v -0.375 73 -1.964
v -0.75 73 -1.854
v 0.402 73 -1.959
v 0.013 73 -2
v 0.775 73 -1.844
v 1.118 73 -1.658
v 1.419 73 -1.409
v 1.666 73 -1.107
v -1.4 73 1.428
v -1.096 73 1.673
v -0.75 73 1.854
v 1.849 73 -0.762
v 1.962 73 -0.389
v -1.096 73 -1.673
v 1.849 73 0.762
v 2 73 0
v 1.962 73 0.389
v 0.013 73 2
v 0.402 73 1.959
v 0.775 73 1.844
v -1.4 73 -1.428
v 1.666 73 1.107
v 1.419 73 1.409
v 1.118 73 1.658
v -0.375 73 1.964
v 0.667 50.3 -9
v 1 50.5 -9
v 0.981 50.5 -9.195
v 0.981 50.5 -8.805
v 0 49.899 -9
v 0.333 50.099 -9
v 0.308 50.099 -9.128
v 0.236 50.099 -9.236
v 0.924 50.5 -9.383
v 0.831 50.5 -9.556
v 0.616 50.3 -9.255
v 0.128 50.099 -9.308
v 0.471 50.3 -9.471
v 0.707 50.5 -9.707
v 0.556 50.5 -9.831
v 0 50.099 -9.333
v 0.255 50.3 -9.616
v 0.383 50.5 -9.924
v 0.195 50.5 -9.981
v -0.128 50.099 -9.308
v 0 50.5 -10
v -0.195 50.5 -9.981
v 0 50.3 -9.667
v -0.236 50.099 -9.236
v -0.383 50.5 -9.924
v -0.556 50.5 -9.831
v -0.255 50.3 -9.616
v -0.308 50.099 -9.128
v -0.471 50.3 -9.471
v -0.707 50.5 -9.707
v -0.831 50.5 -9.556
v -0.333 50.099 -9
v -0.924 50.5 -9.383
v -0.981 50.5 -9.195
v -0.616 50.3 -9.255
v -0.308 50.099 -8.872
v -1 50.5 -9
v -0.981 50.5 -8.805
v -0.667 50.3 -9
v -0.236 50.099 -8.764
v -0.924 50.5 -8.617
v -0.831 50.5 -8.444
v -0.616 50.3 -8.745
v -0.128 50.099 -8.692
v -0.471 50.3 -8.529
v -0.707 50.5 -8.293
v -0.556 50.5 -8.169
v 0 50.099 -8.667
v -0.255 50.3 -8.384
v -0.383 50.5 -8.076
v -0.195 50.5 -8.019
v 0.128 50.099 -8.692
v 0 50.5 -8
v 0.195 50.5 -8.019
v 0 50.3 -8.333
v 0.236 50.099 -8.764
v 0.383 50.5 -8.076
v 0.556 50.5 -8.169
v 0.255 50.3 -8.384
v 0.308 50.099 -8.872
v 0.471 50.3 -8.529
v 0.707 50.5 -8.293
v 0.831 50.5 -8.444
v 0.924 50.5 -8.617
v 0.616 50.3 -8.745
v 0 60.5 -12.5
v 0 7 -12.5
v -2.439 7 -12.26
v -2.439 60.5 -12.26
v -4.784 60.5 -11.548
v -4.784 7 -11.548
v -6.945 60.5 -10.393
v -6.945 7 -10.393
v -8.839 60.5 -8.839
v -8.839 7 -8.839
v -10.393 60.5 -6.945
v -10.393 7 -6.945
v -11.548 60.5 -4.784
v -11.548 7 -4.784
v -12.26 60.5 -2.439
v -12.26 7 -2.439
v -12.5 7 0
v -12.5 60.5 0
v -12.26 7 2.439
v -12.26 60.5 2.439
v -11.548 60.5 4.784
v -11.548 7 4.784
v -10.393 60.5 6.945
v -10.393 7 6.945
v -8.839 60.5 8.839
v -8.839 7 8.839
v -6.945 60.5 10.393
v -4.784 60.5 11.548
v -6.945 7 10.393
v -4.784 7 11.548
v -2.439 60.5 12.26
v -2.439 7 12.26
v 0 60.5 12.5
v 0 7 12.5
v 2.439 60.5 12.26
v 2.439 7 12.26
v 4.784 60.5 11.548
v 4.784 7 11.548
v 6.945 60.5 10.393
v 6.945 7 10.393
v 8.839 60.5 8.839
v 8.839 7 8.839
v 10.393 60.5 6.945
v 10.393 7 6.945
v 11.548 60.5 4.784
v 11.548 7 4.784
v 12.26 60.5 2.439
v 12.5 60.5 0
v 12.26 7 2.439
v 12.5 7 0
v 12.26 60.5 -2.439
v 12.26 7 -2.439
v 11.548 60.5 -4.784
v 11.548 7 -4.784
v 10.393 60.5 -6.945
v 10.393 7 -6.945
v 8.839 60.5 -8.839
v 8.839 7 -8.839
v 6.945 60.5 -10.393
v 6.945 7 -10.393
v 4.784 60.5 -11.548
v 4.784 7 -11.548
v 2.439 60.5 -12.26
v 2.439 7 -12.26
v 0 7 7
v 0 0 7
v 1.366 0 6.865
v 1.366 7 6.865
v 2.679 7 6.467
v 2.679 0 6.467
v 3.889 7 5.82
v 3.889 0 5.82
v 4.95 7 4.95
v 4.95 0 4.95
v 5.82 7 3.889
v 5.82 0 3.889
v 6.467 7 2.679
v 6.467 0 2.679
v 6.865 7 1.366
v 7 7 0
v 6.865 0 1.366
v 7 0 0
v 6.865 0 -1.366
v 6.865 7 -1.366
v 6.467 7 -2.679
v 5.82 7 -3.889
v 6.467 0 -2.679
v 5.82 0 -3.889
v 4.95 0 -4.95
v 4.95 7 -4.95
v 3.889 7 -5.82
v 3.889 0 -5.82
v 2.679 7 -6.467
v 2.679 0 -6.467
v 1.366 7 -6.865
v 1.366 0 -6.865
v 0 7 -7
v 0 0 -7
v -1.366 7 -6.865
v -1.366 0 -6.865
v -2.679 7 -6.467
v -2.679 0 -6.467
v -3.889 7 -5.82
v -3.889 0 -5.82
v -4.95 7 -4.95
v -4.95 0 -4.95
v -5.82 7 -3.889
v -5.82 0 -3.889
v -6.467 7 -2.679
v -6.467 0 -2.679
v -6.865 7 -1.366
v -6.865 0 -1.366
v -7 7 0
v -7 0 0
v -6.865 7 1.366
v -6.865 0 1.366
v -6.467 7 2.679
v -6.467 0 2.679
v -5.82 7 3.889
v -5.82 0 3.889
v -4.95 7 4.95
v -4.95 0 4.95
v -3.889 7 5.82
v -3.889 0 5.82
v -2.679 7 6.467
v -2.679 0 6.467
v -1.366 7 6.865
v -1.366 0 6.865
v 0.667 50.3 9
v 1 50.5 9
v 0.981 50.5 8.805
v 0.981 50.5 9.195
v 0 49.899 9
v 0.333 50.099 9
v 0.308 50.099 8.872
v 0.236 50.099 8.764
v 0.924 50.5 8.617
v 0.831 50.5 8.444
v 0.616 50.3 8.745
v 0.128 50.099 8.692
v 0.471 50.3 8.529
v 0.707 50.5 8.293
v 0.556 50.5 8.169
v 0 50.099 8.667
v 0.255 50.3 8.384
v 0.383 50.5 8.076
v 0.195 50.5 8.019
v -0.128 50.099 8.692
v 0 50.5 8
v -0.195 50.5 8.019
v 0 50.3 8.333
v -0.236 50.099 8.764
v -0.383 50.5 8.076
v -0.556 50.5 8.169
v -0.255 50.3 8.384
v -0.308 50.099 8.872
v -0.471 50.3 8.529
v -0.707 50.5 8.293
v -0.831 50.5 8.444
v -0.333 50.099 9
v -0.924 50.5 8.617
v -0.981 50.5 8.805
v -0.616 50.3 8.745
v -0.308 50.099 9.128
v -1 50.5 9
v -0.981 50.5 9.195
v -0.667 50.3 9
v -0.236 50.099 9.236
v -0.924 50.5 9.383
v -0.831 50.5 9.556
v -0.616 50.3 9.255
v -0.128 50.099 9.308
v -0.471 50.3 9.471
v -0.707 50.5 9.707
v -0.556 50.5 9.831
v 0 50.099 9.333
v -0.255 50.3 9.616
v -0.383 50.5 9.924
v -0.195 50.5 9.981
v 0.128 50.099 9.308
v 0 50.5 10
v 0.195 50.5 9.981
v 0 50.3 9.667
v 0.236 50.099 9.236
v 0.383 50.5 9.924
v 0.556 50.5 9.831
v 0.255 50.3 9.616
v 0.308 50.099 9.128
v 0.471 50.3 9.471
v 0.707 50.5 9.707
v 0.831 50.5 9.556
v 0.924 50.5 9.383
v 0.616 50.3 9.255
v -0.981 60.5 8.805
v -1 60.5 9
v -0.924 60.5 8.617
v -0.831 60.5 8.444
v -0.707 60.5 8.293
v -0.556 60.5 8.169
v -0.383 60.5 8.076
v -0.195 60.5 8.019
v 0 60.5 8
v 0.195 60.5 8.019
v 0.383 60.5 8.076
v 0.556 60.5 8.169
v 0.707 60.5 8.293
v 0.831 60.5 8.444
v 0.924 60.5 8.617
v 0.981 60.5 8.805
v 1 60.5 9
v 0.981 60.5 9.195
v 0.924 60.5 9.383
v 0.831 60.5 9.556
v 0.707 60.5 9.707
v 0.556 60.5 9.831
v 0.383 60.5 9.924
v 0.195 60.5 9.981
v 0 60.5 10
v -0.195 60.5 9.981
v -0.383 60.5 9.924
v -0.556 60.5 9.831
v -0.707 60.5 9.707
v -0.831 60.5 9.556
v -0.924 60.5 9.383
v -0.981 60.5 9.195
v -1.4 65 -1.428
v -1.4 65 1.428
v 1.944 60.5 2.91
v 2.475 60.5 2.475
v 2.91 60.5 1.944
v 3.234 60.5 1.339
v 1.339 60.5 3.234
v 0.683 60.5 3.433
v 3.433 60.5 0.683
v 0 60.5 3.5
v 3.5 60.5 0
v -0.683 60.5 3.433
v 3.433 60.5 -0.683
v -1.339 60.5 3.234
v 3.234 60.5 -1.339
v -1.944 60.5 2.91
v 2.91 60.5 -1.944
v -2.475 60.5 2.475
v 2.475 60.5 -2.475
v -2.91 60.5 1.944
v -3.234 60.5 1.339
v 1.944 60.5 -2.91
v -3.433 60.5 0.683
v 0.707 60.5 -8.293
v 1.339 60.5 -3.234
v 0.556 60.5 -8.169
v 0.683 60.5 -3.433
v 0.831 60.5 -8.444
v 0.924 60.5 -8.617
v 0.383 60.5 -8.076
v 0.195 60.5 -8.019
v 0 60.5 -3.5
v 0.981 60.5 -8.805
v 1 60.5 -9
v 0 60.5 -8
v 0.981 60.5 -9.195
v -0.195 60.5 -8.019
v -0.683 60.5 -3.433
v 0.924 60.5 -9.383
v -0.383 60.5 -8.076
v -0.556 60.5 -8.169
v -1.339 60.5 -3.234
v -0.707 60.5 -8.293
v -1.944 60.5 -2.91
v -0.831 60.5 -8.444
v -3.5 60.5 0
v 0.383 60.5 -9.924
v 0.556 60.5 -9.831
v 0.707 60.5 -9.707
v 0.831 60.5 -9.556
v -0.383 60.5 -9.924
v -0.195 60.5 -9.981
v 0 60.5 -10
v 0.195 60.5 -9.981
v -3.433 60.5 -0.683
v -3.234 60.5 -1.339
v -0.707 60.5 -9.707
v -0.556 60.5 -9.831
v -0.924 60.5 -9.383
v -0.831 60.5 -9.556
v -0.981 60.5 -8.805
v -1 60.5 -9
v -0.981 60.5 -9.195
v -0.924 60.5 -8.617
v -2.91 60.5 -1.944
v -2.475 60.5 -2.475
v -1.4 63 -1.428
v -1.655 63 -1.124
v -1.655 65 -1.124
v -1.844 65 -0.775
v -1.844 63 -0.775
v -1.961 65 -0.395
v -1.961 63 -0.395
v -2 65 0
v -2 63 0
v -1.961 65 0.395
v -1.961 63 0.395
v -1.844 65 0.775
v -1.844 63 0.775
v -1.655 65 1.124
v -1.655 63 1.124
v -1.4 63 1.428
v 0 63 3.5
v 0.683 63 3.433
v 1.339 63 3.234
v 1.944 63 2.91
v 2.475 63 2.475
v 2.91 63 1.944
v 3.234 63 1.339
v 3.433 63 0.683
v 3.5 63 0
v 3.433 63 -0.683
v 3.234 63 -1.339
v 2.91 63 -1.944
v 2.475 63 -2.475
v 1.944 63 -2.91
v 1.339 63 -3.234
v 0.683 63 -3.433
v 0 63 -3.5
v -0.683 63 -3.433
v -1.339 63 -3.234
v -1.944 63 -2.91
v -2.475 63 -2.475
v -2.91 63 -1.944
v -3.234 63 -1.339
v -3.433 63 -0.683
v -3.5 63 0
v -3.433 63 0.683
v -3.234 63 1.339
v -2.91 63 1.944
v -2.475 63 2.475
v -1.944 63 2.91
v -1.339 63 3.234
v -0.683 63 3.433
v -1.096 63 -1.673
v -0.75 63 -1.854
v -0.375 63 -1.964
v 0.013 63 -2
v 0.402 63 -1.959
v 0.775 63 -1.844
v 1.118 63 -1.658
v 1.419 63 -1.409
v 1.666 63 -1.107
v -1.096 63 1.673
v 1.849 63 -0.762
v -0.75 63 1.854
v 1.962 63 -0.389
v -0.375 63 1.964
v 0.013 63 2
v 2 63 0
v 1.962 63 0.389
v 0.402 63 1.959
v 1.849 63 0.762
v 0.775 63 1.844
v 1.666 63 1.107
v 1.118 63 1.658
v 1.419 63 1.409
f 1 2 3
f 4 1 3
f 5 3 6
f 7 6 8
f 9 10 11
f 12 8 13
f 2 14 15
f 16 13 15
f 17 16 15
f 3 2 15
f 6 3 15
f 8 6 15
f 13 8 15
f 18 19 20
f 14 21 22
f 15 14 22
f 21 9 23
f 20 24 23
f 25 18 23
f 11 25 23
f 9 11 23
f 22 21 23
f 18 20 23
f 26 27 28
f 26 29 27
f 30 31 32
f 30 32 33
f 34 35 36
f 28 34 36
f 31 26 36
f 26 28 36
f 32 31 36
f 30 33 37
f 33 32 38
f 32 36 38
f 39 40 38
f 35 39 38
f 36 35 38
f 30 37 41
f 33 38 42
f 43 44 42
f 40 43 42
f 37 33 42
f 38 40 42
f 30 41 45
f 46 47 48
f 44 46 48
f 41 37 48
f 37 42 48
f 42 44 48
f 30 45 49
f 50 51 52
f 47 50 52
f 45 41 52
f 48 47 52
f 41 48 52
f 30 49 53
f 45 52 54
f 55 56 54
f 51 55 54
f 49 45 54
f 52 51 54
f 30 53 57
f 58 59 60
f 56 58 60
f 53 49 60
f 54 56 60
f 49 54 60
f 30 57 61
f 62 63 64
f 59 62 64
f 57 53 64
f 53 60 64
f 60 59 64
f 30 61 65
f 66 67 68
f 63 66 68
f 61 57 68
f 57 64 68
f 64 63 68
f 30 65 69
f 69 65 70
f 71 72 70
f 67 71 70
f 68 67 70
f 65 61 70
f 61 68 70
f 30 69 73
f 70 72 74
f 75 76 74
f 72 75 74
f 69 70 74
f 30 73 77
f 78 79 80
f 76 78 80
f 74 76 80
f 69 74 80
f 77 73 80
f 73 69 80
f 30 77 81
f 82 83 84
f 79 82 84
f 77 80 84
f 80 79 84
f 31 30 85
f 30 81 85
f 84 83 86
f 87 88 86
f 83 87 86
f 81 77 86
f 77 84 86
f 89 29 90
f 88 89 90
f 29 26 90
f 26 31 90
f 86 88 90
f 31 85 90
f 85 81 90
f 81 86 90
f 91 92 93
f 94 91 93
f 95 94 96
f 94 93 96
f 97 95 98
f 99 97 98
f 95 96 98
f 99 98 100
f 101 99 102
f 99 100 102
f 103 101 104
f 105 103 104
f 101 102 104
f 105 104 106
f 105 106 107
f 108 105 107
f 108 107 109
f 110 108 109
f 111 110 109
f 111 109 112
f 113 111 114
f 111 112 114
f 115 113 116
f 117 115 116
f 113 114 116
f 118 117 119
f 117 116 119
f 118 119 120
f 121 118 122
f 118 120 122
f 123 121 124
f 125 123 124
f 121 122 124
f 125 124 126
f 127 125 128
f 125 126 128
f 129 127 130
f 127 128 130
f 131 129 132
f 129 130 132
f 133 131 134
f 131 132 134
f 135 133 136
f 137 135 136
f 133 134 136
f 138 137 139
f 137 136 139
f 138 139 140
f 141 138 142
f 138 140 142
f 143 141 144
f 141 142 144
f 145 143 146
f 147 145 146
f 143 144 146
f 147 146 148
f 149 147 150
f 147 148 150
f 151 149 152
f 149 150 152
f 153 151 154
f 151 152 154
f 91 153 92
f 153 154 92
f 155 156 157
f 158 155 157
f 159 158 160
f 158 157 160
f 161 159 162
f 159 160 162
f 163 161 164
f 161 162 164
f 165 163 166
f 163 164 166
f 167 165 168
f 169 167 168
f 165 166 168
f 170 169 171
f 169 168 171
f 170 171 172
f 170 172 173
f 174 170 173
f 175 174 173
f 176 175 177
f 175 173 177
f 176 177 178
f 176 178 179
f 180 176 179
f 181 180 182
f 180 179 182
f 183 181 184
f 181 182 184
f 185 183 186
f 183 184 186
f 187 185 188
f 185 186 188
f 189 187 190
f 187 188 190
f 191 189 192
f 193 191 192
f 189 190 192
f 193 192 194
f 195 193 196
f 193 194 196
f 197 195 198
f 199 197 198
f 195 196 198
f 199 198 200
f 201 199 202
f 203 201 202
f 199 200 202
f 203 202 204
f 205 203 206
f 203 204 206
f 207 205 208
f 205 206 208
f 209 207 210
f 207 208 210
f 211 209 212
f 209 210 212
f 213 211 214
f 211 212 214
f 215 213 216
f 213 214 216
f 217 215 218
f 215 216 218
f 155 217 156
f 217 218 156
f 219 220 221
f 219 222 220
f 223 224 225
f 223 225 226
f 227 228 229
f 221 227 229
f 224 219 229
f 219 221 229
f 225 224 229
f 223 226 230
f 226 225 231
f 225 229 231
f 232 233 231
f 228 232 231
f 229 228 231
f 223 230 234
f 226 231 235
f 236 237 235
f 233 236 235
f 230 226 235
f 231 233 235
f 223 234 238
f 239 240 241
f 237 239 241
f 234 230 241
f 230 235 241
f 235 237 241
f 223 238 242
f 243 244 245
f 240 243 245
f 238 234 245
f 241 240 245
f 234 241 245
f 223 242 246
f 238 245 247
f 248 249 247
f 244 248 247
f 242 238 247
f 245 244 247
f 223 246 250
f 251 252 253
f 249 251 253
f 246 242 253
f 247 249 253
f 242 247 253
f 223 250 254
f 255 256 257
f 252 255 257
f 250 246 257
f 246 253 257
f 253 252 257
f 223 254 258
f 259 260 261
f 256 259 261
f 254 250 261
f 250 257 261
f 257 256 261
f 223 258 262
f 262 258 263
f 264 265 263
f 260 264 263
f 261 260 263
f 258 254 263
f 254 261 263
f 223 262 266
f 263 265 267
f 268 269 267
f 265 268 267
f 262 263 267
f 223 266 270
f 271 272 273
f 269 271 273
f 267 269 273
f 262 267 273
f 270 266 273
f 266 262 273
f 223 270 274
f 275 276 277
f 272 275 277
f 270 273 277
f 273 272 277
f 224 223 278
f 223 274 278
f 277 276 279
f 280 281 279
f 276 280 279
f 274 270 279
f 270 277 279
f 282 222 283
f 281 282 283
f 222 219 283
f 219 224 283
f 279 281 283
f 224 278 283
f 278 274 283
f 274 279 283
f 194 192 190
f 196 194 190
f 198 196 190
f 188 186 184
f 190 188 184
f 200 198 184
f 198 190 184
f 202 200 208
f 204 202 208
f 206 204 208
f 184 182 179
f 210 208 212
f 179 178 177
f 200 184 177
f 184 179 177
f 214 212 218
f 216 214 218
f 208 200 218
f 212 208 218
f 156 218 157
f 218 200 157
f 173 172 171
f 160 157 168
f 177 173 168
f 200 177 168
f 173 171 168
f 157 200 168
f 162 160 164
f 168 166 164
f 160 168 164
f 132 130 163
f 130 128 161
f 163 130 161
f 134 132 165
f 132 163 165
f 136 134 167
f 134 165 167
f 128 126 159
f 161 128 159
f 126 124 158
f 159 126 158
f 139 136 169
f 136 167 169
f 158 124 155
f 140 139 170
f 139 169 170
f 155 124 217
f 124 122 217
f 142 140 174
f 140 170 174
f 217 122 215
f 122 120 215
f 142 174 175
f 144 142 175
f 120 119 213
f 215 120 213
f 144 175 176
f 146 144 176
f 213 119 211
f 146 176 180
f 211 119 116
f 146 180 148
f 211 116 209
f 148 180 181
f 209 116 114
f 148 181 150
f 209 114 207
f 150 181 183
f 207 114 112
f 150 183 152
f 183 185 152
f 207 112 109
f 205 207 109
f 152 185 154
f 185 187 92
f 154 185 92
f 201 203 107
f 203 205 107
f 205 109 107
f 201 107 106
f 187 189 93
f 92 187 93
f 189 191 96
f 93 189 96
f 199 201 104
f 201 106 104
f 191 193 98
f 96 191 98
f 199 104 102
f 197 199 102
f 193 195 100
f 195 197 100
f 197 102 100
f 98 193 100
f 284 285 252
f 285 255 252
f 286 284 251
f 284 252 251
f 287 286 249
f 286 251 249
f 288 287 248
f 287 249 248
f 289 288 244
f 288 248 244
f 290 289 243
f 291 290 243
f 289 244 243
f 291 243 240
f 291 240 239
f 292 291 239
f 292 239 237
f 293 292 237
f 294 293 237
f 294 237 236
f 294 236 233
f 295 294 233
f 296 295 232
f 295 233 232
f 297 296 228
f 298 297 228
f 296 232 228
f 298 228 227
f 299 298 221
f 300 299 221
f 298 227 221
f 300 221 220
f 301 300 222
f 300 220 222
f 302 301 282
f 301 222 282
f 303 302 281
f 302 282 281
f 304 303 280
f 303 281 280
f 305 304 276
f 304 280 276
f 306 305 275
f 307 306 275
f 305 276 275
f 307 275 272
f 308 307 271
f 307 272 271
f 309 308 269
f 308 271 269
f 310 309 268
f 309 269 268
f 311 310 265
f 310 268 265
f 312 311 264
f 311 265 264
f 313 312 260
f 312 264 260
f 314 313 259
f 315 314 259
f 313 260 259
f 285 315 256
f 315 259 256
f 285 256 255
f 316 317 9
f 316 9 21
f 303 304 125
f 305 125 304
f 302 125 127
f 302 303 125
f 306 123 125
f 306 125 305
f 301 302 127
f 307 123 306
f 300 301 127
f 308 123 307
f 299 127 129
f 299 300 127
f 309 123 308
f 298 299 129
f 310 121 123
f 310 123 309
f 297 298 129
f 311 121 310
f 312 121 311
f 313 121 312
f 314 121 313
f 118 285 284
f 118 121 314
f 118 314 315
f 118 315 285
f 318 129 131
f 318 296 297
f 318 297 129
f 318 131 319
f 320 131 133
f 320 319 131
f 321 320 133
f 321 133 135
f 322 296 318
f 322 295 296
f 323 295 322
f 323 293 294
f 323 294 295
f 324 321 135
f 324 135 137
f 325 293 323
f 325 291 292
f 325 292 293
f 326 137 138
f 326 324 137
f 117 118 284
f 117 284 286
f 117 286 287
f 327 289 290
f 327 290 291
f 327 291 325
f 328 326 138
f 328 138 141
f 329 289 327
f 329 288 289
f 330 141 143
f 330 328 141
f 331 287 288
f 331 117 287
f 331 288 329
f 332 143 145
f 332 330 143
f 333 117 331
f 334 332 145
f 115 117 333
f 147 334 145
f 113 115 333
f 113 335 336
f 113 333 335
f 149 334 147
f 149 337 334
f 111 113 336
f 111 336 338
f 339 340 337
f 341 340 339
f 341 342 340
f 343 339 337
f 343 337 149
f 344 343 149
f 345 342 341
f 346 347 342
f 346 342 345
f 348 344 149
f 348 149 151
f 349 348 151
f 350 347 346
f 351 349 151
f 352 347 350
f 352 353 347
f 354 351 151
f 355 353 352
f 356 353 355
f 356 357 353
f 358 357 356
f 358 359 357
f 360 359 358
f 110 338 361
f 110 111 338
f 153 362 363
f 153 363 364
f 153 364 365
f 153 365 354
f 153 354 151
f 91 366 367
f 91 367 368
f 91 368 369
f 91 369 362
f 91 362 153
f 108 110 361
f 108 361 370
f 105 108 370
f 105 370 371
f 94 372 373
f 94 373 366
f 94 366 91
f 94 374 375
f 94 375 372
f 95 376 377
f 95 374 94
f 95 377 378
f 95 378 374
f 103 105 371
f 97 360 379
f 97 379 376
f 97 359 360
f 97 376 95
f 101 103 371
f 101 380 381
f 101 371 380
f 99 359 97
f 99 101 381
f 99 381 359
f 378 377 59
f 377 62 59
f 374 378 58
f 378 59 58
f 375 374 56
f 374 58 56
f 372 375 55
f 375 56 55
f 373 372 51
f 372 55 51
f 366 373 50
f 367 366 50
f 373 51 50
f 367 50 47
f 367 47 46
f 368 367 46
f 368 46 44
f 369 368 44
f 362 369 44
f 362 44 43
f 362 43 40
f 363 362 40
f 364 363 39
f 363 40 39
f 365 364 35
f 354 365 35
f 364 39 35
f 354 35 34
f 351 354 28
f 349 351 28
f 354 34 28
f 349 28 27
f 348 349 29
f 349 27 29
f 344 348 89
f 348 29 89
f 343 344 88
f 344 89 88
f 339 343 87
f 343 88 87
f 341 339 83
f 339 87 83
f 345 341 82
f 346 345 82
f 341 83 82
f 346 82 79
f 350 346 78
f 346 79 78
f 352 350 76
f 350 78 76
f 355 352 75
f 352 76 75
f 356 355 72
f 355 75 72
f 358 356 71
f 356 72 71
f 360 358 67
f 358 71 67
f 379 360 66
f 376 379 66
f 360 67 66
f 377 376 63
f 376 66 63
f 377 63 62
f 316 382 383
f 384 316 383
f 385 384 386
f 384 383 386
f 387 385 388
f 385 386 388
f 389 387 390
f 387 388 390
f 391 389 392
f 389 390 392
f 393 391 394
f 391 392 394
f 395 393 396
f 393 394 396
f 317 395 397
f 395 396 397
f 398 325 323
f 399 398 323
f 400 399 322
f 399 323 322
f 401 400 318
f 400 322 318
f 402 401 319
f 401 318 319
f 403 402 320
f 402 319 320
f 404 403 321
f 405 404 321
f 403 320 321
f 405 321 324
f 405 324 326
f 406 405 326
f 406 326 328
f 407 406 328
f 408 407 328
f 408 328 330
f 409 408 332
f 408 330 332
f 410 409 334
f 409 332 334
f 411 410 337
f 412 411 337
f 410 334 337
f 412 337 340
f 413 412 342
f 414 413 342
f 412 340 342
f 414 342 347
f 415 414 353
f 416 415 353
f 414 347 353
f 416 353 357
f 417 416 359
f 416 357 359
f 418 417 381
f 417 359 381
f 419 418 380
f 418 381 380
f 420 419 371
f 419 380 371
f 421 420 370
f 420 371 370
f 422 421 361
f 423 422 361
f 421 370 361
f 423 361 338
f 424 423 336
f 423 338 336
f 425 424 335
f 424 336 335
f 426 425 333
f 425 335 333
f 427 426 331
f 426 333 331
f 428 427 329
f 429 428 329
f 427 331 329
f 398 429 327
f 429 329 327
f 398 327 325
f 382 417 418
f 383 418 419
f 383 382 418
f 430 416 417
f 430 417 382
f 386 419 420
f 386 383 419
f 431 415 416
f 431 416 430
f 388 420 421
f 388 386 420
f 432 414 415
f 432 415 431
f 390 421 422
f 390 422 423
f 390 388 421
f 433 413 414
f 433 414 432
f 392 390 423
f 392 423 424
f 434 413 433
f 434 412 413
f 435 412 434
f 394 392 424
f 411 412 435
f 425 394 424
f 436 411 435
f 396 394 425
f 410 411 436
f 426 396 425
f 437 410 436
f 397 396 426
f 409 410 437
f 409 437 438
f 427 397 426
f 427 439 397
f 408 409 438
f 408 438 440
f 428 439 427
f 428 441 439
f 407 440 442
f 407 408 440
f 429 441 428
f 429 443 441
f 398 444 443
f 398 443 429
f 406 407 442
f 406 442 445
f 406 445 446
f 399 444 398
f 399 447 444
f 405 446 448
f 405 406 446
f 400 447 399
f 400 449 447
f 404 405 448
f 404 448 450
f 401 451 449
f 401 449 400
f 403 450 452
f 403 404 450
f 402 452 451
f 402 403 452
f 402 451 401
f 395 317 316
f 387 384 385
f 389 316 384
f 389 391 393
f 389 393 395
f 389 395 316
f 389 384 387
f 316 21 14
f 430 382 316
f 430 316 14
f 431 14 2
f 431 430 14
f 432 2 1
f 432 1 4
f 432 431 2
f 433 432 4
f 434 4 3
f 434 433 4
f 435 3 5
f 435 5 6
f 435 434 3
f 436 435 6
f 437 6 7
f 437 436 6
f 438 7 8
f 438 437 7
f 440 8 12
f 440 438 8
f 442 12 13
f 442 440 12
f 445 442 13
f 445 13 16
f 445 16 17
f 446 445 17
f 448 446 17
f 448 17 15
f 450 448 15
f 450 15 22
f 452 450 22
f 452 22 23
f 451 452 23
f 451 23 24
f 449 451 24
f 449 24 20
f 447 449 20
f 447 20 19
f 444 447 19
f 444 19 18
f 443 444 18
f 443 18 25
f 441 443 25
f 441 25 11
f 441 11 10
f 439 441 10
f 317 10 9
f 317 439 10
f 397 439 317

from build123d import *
from build123d.topology import SkipClean

# Parameters (mm, degrees)
SKETCH1_R        = 7
EXTRUSION1_DEPTH = 7
SKETCH2_R        = 12.5
EXTRUSION2_DEPTH = 53.5
SKETCH3_R        = 3.5
EXTRUSION3_DEPTH = 2.5
EXTRUSION4_DEPTH = 10
SKETCH5_R        = 2
EXTRUSION5_DEPTH = 2
HOLE1_D          = 2
HOLE1_DEPTH      = 10
HOLE1_TIP        = 0.600860619


with BuildPart() as part:
    # Sketch1 → Extrusion1 (new body)
    with BuildSketch(Plane(origin=(0, 0, 0), x_dir=(-1, 0, 0), z_dir=(0, 1, 0))):
        with Locations(Location((0, 0, 0), (0, 0, 90))):
            Circle(SKETCH1_R)
    extrude(amount=EXTRUSION1_DEPTH)

    # Sketch2 → Extrusion2 (add)
    with BuildSketch(Plane(origin=(0, 7, 0), x_dir=(-1, 0, 0), z_dir=(0, 1, 0))):
        with Locations(Location((0, 0, 0), (0, 0, 270))):
            Circle(SKETCH2_R)
    extrude(amount=EXTRUSION2_DEPTH)

    # Sketch3 → Extrusion3 (add)
    with BuildSketch(Plane(origin=(0, 60.5, 0), x_dir=(-1, 0, 0), z_dir=(0, 1, 0))):
        with Locations(Location((0, 0, 0), (0, 0, 90))):
            Circle(SKETCH3_R)
    extrude(amount=EXTRUSION3_DEPTH)

    # Sketch4 → Extrusion4 (add)
    with BuildSketch(Plane(origin=(0, 63, 0), x_dir=(-1, 0, 0), z_dir=(0, 1, 0))):
        with BuildLine():
            Line((1.4, 1.428285686), (1.4, -1.428285686))
            ThreePointArc((1.4, -1.428285686), (-2, 0), (1.4, 1.428285686))
        make_face()
    extrude(amount=EXTRUSION4_DEPTH)

    # Sketch5 → Extrusion5 (add)
    with SkipClean():  # the faces are left unmerged after this step: merging them gives an invalid solid
        with BuildSketch(Plane(origin=(0, 63, 0), x_dir=(1, 0, 0), z_dir=(0, 1, 0))):
            with Locations(Location((0, 0, 0), (0, 0, 134.427004001))):
                Circle(SKETCH5_R)
        extrude(amount=EXTRUSION5_DEPTH)

    # Hole1
    with Locations(Plane(origin=(0, 60.5, 0), x_dir=(1, 0, 0), z_dir=(0, 1, 0))):
        with Locations((0, -9), (0, 9)):
            Hole(HOLE1_D / 2, depth=HOLE1_DEPTH)
            with Locations((0, 0, -(HOLE1_DEPTH + HOLE1_TIP / 2))):  # 118° drill point
                Cone(0, HOLE1_D / 2, HOLE1_TIP, mode=Mode.SUBTRACT)


solid = part.part
